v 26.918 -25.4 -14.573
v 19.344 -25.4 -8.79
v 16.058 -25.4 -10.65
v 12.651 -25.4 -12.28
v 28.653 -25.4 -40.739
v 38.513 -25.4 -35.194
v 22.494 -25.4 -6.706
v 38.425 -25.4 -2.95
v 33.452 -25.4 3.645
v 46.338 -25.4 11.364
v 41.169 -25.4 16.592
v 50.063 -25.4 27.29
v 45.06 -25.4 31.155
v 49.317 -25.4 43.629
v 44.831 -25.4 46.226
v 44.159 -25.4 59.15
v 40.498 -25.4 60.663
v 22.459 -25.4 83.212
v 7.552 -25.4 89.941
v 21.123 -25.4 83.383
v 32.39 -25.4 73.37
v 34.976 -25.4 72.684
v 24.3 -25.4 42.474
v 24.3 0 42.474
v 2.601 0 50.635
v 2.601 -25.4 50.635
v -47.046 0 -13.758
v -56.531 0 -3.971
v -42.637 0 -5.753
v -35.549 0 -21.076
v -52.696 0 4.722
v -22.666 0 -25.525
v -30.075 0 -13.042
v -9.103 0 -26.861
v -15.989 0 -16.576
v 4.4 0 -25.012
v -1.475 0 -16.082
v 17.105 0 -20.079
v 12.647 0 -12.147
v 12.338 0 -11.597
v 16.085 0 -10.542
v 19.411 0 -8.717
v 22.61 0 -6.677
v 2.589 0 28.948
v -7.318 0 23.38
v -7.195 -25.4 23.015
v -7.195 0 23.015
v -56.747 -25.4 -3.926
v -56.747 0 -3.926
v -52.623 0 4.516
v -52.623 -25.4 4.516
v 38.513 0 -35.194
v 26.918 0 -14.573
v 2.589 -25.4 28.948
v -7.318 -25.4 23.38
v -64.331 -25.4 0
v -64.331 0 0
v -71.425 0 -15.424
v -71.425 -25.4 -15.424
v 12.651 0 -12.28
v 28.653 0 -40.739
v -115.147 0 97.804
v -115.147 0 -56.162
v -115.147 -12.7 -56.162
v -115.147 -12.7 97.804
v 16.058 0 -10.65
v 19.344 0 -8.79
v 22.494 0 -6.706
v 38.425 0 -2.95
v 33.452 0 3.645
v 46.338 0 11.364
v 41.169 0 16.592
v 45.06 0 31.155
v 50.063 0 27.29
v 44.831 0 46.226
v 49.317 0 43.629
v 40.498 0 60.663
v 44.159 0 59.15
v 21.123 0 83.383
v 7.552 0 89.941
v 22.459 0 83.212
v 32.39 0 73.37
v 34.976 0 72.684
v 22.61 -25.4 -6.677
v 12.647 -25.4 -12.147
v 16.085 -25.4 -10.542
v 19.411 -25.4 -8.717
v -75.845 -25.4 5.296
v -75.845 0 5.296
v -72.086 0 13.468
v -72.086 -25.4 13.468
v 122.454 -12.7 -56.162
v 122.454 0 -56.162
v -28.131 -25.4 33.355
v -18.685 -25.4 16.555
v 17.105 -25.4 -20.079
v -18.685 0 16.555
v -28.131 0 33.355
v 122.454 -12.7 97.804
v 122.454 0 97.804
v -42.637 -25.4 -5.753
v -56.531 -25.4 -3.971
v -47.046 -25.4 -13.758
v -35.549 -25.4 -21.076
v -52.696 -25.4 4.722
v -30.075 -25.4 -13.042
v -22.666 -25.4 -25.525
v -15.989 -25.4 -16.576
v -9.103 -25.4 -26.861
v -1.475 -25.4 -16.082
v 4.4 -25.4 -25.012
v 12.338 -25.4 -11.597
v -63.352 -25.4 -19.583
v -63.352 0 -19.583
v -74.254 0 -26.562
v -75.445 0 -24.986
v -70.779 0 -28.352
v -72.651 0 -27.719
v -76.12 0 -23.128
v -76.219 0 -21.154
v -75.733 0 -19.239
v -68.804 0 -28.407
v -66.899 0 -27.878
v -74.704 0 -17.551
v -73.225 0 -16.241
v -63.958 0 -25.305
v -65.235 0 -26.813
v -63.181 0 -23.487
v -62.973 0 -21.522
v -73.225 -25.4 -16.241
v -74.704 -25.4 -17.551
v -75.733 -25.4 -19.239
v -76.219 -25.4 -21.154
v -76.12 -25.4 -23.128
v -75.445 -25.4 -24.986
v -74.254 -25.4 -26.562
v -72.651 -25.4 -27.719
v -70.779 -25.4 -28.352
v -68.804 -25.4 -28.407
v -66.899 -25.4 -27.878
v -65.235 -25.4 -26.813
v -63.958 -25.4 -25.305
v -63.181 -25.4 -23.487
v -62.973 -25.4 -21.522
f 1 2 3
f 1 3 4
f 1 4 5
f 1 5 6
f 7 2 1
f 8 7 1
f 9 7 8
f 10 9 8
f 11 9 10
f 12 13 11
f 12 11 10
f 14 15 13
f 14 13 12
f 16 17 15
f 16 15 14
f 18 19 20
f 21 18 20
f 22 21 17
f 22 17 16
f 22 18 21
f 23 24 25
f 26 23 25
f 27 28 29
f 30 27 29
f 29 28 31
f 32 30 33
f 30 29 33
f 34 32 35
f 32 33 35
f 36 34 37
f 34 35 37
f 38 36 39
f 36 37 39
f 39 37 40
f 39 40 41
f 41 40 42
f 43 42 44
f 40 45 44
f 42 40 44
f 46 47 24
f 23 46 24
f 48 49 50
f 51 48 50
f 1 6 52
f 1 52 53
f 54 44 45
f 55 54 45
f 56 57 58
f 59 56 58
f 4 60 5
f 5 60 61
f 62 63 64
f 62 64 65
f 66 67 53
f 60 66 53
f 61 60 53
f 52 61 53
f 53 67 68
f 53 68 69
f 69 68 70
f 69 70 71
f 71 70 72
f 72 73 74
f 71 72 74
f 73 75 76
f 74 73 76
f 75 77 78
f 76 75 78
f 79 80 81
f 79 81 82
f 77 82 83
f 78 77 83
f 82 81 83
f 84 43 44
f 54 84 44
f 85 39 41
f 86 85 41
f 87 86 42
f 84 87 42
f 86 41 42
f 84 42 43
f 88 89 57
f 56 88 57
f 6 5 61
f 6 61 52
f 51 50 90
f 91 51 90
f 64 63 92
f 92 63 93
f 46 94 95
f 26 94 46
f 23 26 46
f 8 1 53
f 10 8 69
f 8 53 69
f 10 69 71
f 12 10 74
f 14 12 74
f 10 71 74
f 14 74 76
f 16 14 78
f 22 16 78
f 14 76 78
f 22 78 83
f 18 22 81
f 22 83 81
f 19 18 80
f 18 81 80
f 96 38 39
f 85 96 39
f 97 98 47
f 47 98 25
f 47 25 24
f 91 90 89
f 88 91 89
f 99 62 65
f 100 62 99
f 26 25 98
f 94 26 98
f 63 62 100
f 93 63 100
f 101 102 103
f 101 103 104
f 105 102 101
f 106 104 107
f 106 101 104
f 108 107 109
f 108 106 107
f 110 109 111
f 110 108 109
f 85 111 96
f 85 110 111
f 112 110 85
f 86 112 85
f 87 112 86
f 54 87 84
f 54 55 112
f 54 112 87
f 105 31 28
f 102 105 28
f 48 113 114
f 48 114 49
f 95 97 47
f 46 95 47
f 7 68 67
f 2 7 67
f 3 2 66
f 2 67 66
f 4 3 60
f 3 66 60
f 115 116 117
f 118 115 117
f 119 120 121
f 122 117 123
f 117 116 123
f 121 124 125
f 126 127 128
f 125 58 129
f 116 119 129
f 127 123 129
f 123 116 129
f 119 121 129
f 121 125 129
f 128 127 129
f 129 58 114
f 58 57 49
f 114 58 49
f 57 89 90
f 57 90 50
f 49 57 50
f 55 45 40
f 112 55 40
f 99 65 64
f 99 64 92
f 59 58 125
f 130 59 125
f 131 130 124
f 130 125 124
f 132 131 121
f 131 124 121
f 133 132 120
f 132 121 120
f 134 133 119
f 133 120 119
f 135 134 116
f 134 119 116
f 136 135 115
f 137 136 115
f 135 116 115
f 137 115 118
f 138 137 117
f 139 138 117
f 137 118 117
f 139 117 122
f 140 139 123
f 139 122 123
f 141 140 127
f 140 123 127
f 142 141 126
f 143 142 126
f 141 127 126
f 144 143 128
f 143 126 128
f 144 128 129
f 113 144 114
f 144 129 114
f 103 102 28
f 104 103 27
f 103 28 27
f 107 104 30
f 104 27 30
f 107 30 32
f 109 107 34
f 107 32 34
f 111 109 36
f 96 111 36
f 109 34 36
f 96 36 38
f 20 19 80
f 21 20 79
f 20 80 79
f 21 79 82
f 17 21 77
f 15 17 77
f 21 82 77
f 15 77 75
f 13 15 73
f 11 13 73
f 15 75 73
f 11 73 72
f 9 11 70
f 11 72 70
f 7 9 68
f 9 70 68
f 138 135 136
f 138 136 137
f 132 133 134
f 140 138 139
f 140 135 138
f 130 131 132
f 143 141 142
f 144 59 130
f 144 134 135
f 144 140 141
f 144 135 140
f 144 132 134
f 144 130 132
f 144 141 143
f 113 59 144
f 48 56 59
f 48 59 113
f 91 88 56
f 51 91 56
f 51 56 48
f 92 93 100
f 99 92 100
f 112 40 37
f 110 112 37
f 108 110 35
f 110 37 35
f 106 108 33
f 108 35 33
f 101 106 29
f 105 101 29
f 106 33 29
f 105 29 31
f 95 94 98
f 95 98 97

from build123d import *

# Parameters (mm, degrees)
F2_DEPTH = 25.4
F3_W     = 237.6009970903
F3_H     = 153.9654433727
F4_DEPTH = 12.7


with BuildPart() as f2:
    # F0 (on Front) → F2 (new body)
    with BuildSketch(Plane.XZ):
        with BuildLine():
            Line((-64.3306672573, 0), (-71.4252218604, -15.4237253591))
            ThreePointArc((-71.4252218604, -15.4237253591), (-72.6511323462, -27.7185305075), (-63.3521154523, -19.5825994015))
            Line((-63.3521154523, -19.5825994015), (-56.7466728389, -3.9256610908))
            Line((-56.7466728389, -3.9256610908), (-64.3306672573, 0))
        make_face()
        Polygon((-75.8445660615, 5.296125408), (-64.3306672573, 0), (-56.7466728389, -3.9256610908), (-52.6234121387, 4.5160594285), (-72.0855967984, 13.4682112951), align=None)
    extrude(amount=F2_DEPTH)


with BuildPart() as f2b:
    # F0 (on Front) → F2, piece 2 (new body)
    with BuildSketch(Plane.XZ):
        Polygon((-18.6845945711, 16.555041561), (-7.1953465231, 23.0153091252), (24.2997054011, 42.4743108451), (2.6012415412, 50.6354220424), (-28.1310292188, 33.355031617), align=None)
    extrude(amount=F2_DEPTH)


with BuildPart() as f2c:
    # F0 (on Front) → F2, piece 3 (new body)
    with BuildSketch(Plane.XZ):
        with BuildLine():
            ThreePointArc((22.4944953294, -6.7063916159), (17.7171299982, -9.748369789), (12.6509112915, -12.2802226143))
            Line((12.6509112915, -12.2802226143), (17.3099082645, -20.5660051064))
            ThreePointArc((17.3099082645, -20.5660051064), (22.2566100758, -17.7984094918), (26.9180159505, -14.5733917296))
            Line((26.9180159505, -14.5733917296), (22.4944953294, -6.7063916159))
        make_face()
        with BuildLine():
            ThreePointArc((7.5516351178, 89.9414640887), (44.8309857608, 46.2261805414), (22.4944953294, -6.7063916159))
            Line((22.4944953294, -6.7063916159), (26.9180159505, -14.5733917296))
            ThreePointArc((26.9180159505, -14.5733917296), (49.3174772695, 43.6288834146), (7.5516351178, 89.9414640887))
        make_face()
        with BuildLine():
            ThreePointArc((26.9180159505, -14.5733917296), (22.2566100758, -17.7984094918), (17.3099082645, -20.5660051064))
            Line((17.3099082645, -20.5660051064), (28.6526773125, -40.7385267317))
            Line((28.6526773125, -40.7385267317), (38.5128803721, -35.1942517944))
            Line((38.5128803721, -35.1942517944), (26.9180159505, -14.5733917296))
        make_face()
    extrude(amount=F2_DEPTH)


with BuildPart() as f2d:
    # F1 (on Front) → F2, piece 4 (new body)
    with BuildSketch(Plane.XZ):
        with BuildLine():
            Line((-52.6955723763, 4.7223349102), (-56.5307512879, -3.9707440883))
            ThreePointArc((-56.5307512879, -3.9707440883), (-22.6661115444, -25.5245276399), (17.104735598, -20.0785081834))
            Line((17.104735598, -20.0785081834), (12.6471872308, -12.1466942847))
            Line((12.6471872308, -12.1466942847), (12.3380959022, -11.5966935457))
            ThreePointArc((12.3380959022, -11.5966935457), (-23.156184417, -15.3027292619), (-52.6955723763, 4.7223349102))
        make_face()
        with BuildLine():
            Line((12.3380959022, -11.5966935457), (12.6471872308, -12.1466942847))
            ThreePointArc((12.6471872308, -12.1466942847), (17.7628642759, -9.6566366334), (22.6099974974, -6.6774021226))
            Line((22.6099974974, -6.6774021226), (2.5890725665, 28.9480667561))
            Line((2.5890725665, 28.9480667561), (-7.3183678898, 23.3802489035))
            Line((-7.3183678898, 23.3802489035), (12.3380959022, -11.5966935457))
        make_face()
    extrude(amount=F2_DEPTH)


with BuildPart() as f4:
    # F3 (on Front) → F4 (new body)
    with BuildSketch(Plane.XZ):
        with Locations((3.6535635591, 20.8210796118)):
            Rectangle(F3_W, F3_H)
    extrude(amount=F4_DEPTH)


solid = Compound([f2.part, f2b.part, f2c.part, f2d.part, f4.part])
